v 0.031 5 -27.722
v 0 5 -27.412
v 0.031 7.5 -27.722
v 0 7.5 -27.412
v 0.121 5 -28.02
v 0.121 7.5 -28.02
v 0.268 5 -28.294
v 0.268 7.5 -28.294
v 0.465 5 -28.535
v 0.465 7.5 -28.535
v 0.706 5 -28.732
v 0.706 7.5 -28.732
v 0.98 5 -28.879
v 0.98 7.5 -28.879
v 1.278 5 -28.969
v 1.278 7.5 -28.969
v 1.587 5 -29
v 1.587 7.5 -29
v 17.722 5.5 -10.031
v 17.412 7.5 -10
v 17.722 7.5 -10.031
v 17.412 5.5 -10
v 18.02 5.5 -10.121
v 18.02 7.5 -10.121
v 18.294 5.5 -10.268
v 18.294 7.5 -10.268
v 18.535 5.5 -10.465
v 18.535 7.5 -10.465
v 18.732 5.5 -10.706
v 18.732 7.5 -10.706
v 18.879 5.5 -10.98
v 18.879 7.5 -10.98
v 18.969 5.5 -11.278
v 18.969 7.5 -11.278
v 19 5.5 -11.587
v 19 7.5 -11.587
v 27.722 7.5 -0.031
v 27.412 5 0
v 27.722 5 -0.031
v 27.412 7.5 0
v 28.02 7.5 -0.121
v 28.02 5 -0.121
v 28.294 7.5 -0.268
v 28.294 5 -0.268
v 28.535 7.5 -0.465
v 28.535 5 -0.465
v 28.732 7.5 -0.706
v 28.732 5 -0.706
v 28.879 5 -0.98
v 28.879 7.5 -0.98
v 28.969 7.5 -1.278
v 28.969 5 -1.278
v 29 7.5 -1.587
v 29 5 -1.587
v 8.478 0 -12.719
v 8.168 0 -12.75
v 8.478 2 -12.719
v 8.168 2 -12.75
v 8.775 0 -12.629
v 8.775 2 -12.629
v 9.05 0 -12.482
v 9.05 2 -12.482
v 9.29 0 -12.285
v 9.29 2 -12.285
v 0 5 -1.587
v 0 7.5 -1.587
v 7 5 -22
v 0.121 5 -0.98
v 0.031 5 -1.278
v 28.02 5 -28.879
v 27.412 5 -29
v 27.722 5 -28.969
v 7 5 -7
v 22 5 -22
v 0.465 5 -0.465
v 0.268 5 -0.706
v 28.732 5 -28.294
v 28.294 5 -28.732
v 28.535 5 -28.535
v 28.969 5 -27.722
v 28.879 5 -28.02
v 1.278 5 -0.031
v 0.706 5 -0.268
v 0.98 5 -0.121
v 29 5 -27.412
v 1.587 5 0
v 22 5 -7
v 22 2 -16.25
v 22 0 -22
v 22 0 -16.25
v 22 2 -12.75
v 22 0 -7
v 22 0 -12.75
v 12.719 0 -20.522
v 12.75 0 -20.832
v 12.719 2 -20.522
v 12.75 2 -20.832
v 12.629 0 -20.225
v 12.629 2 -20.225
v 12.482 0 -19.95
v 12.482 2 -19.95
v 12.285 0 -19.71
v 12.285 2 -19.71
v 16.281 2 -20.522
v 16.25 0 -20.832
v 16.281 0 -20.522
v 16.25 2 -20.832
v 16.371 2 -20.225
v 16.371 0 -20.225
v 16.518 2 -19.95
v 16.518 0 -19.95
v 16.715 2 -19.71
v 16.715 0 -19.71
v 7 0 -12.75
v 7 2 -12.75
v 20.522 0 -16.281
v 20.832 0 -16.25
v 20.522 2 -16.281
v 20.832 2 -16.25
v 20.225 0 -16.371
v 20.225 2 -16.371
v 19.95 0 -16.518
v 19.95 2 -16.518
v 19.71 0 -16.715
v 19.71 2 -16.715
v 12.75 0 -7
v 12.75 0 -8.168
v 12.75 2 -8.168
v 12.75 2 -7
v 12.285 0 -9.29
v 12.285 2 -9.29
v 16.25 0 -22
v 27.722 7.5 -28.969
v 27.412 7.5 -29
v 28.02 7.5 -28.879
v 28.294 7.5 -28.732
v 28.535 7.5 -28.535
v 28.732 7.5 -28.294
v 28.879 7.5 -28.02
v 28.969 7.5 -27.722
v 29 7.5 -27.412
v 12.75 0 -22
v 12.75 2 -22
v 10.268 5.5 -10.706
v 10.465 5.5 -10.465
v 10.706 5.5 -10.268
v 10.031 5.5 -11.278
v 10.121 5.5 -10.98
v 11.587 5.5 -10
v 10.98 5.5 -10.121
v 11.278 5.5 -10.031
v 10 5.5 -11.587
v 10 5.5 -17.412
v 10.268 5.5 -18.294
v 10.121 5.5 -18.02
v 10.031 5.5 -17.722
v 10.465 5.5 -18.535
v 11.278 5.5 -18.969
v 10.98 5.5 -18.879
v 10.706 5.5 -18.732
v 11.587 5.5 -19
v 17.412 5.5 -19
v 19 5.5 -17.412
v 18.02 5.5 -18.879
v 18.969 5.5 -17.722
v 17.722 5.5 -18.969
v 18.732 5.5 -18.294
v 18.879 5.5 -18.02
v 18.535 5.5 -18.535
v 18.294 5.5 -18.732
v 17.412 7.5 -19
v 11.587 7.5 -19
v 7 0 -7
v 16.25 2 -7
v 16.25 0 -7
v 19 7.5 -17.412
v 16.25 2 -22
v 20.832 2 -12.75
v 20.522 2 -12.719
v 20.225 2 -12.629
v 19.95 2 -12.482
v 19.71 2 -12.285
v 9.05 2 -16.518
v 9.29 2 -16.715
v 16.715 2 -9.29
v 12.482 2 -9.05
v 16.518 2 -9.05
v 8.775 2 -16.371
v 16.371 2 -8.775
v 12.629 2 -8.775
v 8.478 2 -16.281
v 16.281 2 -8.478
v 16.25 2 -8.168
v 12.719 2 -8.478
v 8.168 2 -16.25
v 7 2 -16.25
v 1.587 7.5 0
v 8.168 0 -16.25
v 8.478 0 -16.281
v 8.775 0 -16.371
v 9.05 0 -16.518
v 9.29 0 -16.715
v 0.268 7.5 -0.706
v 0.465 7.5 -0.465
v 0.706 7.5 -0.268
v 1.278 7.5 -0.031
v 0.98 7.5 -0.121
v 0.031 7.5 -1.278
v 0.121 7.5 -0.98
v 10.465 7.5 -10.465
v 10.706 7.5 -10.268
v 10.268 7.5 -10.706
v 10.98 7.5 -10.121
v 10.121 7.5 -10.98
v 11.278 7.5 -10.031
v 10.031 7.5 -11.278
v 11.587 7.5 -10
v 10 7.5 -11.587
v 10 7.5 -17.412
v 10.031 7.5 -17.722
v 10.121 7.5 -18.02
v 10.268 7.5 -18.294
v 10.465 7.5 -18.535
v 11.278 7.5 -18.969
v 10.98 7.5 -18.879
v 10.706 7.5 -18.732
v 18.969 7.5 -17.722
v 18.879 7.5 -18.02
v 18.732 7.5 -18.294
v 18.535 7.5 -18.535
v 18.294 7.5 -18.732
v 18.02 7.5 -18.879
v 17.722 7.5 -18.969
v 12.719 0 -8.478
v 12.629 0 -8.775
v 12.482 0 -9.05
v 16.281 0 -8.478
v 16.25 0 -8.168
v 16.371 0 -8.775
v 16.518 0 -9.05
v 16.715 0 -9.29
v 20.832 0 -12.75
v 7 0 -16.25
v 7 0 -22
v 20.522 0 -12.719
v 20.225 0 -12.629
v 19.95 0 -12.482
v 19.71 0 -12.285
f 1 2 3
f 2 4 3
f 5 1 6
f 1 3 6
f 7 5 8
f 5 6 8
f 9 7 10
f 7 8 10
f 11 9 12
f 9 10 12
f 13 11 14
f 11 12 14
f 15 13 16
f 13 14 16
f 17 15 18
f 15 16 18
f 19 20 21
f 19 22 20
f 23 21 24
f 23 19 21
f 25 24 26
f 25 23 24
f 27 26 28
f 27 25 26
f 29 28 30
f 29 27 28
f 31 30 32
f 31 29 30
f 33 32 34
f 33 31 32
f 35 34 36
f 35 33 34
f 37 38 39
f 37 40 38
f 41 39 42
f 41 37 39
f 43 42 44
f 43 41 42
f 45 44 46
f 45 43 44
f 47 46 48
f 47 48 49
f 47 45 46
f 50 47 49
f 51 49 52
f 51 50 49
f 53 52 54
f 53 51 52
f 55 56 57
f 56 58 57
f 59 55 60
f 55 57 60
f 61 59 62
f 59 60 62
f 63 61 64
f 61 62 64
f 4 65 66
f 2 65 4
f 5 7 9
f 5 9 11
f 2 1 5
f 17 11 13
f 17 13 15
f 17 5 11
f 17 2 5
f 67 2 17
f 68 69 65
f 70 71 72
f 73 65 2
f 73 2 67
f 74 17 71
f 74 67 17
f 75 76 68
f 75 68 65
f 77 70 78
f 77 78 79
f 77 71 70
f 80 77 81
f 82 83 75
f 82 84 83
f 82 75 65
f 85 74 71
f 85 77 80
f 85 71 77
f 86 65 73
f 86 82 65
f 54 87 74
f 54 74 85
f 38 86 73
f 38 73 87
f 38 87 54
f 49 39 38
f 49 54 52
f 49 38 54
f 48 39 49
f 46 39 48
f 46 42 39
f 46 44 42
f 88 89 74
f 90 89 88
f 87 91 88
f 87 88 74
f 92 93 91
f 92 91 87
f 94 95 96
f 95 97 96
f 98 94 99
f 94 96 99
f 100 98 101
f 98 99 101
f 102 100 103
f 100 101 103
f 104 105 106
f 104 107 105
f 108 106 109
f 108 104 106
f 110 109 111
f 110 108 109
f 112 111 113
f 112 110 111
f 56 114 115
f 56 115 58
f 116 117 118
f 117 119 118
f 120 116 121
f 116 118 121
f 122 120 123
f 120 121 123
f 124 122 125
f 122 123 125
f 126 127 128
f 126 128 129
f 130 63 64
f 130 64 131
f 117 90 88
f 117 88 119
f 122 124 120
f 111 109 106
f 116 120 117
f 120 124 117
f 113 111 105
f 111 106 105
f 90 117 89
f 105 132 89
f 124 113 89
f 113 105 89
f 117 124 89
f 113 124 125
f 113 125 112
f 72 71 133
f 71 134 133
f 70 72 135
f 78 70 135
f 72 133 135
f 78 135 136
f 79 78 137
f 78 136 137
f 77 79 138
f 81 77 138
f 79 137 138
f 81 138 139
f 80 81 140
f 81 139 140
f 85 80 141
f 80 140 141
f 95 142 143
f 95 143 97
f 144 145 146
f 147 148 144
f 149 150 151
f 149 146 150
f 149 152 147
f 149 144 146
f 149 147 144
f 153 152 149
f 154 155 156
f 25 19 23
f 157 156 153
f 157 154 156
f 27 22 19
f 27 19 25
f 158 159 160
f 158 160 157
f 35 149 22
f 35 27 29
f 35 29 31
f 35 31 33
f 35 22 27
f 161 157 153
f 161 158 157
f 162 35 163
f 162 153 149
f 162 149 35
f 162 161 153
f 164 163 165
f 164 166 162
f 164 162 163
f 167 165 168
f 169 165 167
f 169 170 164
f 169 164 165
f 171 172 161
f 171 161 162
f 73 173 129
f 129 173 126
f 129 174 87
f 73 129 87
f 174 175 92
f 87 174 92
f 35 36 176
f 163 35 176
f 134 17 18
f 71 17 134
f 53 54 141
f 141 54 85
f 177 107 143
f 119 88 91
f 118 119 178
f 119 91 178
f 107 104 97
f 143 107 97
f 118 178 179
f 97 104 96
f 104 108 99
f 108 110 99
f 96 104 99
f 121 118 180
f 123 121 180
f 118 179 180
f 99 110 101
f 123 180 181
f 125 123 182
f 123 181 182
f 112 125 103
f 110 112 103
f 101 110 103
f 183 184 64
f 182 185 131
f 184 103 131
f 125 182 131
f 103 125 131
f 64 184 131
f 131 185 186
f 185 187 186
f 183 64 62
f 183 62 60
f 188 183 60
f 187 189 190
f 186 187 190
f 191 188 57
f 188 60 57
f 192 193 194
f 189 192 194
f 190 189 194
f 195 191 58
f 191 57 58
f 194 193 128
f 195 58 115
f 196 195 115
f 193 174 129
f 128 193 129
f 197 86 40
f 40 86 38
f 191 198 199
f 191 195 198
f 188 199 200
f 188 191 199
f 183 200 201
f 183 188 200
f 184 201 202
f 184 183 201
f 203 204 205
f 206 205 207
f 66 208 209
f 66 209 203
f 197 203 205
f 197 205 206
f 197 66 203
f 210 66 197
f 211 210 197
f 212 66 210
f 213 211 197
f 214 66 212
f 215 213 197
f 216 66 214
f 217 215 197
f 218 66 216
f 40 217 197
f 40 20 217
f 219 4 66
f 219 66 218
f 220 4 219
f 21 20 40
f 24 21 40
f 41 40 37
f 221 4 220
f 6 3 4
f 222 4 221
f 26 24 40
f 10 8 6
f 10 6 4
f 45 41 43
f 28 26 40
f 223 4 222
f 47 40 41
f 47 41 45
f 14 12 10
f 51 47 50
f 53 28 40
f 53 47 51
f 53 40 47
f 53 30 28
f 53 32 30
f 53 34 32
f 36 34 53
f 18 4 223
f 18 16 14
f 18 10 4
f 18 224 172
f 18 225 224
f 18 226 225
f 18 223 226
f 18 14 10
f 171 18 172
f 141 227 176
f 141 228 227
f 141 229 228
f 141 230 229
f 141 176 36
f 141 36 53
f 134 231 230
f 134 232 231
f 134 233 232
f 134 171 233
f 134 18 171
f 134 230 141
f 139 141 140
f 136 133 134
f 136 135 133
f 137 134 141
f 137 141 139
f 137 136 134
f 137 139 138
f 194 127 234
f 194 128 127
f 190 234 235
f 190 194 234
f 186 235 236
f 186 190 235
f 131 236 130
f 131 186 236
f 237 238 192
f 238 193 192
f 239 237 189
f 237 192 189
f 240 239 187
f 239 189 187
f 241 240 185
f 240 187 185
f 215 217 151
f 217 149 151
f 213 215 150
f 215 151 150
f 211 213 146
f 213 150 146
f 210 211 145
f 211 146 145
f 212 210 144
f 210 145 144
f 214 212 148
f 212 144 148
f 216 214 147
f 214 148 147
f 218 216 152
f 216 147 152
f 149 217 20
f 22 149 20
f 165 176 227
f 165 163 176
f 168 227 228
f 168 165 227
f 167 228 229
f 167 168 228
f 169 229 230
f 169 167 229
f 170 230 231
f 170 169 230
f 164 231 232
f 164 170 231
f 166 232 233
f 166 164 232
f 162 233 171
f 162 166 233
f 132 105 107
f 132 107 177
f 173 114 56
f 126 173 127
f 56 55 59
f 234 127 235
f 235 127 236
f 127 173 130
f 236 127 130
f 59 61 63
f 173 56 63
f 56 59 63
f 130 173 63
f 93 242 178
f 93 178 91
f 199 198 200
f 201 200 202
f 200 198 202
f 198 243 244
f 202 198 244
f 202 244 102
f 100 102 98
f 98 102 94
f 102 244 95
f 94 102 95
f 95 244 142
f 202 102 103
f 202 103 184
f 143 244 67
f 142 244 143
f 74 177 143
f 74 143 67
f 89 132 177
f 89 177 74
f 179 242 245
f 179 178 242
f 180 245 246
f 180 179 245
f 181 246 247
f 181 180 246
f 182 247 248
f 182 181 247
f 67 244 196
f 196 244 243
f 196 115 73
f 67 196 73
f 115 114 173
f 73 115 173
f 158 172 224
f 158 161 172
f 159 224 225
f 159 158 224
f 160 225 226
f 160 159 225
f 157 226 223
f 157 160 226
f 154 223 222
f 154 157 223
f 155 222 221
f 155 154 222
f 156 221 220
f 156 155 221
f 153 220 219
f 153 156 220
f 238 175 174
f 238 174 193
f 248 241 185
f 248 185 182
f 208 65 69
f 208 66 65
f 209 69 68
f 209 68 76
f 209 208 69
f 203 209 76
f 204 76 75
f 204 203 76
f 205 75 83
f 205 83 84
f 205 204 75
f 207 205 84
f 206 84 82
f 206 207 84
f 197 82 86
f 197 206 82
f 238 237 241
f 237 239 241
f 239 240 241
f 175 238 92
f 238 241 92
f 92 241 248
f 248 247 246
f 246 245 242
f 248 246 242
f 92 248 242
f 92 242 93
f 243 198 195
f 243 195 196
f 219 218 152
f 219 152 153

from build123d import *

# Parameters (mm, degrees)
SKETCH1_W           = 29
SKETCH1_H           = 29
BOSS_EXTRUDE1_DEPTH = 7.5
SKETCH8_W           = 9
SKETCH8_H           = 9
CUT_EXTRUDE3_DEPTH  = 2
SKETCH9_W           = 29
SKETCH9_H           = 29
SKETCH9_W_2         = 15
SKETCH9_H_2         = 15
CUT_EXTRUDE4_DEPTH  = 5
CUT_EXTRUDE5_DEPTH  = 2
FILLET1_R           = 1.5875


with BuildPart() as part:
    # Sketch1 → Boss-Extrude1 (new body)
    with BuildSketch(Plane(origin=(0, 0, 0), x_dir=(1, 0, 0), z_dir=(0, 1, 0))):
        with Locations((14.5, 14.5)):
            Rectangle(SKETCH1_W, SKETCH1_H)
    extrude(amount=BOSS_EXTRUDE1_DEPTH)

    # Sketch8 → Cut-Extrude3 (cut)
    with BuildSketch(Plane(origin=(0, 7.5, 0), x_dir=(1, 0, 0), z_dir=(0, 1, 0))):
        with Locations((14.5, 14.5)):
            Rectangle(SKETCH8_W, SKETCH8_H)
    extrude(amount=-CUT_EXTRUDE3_DEPTH, mode=Mode.SUBTRACT)

    # Sketch9 → Cut-Extrude4 (cut)
    with BuildSketch(Plane.XZ):
        with Locations((14.5, -14.5)):
            Rectangle(SKETCH9_W, SKETCH9_H)
        with Locations((14.5, -14.5)):
            Rectangle(SKETCH9_W_2, SKETCH9_H_2, mode=Mode.SUBTRACT)
    extrude(amount=-CUT_EXTRUDE4_DEPTH, mode=Mode.SUBTRACT)

    # Sketch10 → Cut-Extrude5 (cut)
    with BuildSketch(Plane.XZ):
        Polygon((12.75, -7), (16.25, -7), (16.25, -8.825378798), (20.174621202, -12.75), (22, -12.75), (22, -16.25), (20.174621202, -16.25), (16.25, -20.174621202), (16.25, -22), (12.75, -22), (12.75, -20.174621202), (8.825378798, -16.25), (7, -16.25), (7, -12.75), (8.825378798, -12.75), (12.75, -8.825378798), align=None)
    extrude(amount=-CUT_EXTRUDE5_DEPTH, mode=Mode.SUBTRACT)

    # Fillet1
    fillet1_edges = [part.edges().sort_by_distance(p)[0] for p in [
        (10, 6.5, -10),
        (10, 6.5, -19),
        (19, 6.5, -19),
        (19, 6.5, -10),
        (12.75, 1, -8.825378798),
        (16.25, 1, -8.825378798),
        (20.174621202, 1, -12.75),
        (20.174621202, 1, -16.25),
        (16.25, 1, -20.174621202),
        (12.75, 1, -20.174621202),
        (8.825378798, 1, -16.25),
        (8.825378798, 1, -12.75),
        (0, 6.25, -29),
        (29, 6.25, -29),
        (29, 6.25, 0),
        (0, 6.25, 0),
    ]]
    fillet(fillet1_edges, radius=FILLET1_R)


solid = part.part
